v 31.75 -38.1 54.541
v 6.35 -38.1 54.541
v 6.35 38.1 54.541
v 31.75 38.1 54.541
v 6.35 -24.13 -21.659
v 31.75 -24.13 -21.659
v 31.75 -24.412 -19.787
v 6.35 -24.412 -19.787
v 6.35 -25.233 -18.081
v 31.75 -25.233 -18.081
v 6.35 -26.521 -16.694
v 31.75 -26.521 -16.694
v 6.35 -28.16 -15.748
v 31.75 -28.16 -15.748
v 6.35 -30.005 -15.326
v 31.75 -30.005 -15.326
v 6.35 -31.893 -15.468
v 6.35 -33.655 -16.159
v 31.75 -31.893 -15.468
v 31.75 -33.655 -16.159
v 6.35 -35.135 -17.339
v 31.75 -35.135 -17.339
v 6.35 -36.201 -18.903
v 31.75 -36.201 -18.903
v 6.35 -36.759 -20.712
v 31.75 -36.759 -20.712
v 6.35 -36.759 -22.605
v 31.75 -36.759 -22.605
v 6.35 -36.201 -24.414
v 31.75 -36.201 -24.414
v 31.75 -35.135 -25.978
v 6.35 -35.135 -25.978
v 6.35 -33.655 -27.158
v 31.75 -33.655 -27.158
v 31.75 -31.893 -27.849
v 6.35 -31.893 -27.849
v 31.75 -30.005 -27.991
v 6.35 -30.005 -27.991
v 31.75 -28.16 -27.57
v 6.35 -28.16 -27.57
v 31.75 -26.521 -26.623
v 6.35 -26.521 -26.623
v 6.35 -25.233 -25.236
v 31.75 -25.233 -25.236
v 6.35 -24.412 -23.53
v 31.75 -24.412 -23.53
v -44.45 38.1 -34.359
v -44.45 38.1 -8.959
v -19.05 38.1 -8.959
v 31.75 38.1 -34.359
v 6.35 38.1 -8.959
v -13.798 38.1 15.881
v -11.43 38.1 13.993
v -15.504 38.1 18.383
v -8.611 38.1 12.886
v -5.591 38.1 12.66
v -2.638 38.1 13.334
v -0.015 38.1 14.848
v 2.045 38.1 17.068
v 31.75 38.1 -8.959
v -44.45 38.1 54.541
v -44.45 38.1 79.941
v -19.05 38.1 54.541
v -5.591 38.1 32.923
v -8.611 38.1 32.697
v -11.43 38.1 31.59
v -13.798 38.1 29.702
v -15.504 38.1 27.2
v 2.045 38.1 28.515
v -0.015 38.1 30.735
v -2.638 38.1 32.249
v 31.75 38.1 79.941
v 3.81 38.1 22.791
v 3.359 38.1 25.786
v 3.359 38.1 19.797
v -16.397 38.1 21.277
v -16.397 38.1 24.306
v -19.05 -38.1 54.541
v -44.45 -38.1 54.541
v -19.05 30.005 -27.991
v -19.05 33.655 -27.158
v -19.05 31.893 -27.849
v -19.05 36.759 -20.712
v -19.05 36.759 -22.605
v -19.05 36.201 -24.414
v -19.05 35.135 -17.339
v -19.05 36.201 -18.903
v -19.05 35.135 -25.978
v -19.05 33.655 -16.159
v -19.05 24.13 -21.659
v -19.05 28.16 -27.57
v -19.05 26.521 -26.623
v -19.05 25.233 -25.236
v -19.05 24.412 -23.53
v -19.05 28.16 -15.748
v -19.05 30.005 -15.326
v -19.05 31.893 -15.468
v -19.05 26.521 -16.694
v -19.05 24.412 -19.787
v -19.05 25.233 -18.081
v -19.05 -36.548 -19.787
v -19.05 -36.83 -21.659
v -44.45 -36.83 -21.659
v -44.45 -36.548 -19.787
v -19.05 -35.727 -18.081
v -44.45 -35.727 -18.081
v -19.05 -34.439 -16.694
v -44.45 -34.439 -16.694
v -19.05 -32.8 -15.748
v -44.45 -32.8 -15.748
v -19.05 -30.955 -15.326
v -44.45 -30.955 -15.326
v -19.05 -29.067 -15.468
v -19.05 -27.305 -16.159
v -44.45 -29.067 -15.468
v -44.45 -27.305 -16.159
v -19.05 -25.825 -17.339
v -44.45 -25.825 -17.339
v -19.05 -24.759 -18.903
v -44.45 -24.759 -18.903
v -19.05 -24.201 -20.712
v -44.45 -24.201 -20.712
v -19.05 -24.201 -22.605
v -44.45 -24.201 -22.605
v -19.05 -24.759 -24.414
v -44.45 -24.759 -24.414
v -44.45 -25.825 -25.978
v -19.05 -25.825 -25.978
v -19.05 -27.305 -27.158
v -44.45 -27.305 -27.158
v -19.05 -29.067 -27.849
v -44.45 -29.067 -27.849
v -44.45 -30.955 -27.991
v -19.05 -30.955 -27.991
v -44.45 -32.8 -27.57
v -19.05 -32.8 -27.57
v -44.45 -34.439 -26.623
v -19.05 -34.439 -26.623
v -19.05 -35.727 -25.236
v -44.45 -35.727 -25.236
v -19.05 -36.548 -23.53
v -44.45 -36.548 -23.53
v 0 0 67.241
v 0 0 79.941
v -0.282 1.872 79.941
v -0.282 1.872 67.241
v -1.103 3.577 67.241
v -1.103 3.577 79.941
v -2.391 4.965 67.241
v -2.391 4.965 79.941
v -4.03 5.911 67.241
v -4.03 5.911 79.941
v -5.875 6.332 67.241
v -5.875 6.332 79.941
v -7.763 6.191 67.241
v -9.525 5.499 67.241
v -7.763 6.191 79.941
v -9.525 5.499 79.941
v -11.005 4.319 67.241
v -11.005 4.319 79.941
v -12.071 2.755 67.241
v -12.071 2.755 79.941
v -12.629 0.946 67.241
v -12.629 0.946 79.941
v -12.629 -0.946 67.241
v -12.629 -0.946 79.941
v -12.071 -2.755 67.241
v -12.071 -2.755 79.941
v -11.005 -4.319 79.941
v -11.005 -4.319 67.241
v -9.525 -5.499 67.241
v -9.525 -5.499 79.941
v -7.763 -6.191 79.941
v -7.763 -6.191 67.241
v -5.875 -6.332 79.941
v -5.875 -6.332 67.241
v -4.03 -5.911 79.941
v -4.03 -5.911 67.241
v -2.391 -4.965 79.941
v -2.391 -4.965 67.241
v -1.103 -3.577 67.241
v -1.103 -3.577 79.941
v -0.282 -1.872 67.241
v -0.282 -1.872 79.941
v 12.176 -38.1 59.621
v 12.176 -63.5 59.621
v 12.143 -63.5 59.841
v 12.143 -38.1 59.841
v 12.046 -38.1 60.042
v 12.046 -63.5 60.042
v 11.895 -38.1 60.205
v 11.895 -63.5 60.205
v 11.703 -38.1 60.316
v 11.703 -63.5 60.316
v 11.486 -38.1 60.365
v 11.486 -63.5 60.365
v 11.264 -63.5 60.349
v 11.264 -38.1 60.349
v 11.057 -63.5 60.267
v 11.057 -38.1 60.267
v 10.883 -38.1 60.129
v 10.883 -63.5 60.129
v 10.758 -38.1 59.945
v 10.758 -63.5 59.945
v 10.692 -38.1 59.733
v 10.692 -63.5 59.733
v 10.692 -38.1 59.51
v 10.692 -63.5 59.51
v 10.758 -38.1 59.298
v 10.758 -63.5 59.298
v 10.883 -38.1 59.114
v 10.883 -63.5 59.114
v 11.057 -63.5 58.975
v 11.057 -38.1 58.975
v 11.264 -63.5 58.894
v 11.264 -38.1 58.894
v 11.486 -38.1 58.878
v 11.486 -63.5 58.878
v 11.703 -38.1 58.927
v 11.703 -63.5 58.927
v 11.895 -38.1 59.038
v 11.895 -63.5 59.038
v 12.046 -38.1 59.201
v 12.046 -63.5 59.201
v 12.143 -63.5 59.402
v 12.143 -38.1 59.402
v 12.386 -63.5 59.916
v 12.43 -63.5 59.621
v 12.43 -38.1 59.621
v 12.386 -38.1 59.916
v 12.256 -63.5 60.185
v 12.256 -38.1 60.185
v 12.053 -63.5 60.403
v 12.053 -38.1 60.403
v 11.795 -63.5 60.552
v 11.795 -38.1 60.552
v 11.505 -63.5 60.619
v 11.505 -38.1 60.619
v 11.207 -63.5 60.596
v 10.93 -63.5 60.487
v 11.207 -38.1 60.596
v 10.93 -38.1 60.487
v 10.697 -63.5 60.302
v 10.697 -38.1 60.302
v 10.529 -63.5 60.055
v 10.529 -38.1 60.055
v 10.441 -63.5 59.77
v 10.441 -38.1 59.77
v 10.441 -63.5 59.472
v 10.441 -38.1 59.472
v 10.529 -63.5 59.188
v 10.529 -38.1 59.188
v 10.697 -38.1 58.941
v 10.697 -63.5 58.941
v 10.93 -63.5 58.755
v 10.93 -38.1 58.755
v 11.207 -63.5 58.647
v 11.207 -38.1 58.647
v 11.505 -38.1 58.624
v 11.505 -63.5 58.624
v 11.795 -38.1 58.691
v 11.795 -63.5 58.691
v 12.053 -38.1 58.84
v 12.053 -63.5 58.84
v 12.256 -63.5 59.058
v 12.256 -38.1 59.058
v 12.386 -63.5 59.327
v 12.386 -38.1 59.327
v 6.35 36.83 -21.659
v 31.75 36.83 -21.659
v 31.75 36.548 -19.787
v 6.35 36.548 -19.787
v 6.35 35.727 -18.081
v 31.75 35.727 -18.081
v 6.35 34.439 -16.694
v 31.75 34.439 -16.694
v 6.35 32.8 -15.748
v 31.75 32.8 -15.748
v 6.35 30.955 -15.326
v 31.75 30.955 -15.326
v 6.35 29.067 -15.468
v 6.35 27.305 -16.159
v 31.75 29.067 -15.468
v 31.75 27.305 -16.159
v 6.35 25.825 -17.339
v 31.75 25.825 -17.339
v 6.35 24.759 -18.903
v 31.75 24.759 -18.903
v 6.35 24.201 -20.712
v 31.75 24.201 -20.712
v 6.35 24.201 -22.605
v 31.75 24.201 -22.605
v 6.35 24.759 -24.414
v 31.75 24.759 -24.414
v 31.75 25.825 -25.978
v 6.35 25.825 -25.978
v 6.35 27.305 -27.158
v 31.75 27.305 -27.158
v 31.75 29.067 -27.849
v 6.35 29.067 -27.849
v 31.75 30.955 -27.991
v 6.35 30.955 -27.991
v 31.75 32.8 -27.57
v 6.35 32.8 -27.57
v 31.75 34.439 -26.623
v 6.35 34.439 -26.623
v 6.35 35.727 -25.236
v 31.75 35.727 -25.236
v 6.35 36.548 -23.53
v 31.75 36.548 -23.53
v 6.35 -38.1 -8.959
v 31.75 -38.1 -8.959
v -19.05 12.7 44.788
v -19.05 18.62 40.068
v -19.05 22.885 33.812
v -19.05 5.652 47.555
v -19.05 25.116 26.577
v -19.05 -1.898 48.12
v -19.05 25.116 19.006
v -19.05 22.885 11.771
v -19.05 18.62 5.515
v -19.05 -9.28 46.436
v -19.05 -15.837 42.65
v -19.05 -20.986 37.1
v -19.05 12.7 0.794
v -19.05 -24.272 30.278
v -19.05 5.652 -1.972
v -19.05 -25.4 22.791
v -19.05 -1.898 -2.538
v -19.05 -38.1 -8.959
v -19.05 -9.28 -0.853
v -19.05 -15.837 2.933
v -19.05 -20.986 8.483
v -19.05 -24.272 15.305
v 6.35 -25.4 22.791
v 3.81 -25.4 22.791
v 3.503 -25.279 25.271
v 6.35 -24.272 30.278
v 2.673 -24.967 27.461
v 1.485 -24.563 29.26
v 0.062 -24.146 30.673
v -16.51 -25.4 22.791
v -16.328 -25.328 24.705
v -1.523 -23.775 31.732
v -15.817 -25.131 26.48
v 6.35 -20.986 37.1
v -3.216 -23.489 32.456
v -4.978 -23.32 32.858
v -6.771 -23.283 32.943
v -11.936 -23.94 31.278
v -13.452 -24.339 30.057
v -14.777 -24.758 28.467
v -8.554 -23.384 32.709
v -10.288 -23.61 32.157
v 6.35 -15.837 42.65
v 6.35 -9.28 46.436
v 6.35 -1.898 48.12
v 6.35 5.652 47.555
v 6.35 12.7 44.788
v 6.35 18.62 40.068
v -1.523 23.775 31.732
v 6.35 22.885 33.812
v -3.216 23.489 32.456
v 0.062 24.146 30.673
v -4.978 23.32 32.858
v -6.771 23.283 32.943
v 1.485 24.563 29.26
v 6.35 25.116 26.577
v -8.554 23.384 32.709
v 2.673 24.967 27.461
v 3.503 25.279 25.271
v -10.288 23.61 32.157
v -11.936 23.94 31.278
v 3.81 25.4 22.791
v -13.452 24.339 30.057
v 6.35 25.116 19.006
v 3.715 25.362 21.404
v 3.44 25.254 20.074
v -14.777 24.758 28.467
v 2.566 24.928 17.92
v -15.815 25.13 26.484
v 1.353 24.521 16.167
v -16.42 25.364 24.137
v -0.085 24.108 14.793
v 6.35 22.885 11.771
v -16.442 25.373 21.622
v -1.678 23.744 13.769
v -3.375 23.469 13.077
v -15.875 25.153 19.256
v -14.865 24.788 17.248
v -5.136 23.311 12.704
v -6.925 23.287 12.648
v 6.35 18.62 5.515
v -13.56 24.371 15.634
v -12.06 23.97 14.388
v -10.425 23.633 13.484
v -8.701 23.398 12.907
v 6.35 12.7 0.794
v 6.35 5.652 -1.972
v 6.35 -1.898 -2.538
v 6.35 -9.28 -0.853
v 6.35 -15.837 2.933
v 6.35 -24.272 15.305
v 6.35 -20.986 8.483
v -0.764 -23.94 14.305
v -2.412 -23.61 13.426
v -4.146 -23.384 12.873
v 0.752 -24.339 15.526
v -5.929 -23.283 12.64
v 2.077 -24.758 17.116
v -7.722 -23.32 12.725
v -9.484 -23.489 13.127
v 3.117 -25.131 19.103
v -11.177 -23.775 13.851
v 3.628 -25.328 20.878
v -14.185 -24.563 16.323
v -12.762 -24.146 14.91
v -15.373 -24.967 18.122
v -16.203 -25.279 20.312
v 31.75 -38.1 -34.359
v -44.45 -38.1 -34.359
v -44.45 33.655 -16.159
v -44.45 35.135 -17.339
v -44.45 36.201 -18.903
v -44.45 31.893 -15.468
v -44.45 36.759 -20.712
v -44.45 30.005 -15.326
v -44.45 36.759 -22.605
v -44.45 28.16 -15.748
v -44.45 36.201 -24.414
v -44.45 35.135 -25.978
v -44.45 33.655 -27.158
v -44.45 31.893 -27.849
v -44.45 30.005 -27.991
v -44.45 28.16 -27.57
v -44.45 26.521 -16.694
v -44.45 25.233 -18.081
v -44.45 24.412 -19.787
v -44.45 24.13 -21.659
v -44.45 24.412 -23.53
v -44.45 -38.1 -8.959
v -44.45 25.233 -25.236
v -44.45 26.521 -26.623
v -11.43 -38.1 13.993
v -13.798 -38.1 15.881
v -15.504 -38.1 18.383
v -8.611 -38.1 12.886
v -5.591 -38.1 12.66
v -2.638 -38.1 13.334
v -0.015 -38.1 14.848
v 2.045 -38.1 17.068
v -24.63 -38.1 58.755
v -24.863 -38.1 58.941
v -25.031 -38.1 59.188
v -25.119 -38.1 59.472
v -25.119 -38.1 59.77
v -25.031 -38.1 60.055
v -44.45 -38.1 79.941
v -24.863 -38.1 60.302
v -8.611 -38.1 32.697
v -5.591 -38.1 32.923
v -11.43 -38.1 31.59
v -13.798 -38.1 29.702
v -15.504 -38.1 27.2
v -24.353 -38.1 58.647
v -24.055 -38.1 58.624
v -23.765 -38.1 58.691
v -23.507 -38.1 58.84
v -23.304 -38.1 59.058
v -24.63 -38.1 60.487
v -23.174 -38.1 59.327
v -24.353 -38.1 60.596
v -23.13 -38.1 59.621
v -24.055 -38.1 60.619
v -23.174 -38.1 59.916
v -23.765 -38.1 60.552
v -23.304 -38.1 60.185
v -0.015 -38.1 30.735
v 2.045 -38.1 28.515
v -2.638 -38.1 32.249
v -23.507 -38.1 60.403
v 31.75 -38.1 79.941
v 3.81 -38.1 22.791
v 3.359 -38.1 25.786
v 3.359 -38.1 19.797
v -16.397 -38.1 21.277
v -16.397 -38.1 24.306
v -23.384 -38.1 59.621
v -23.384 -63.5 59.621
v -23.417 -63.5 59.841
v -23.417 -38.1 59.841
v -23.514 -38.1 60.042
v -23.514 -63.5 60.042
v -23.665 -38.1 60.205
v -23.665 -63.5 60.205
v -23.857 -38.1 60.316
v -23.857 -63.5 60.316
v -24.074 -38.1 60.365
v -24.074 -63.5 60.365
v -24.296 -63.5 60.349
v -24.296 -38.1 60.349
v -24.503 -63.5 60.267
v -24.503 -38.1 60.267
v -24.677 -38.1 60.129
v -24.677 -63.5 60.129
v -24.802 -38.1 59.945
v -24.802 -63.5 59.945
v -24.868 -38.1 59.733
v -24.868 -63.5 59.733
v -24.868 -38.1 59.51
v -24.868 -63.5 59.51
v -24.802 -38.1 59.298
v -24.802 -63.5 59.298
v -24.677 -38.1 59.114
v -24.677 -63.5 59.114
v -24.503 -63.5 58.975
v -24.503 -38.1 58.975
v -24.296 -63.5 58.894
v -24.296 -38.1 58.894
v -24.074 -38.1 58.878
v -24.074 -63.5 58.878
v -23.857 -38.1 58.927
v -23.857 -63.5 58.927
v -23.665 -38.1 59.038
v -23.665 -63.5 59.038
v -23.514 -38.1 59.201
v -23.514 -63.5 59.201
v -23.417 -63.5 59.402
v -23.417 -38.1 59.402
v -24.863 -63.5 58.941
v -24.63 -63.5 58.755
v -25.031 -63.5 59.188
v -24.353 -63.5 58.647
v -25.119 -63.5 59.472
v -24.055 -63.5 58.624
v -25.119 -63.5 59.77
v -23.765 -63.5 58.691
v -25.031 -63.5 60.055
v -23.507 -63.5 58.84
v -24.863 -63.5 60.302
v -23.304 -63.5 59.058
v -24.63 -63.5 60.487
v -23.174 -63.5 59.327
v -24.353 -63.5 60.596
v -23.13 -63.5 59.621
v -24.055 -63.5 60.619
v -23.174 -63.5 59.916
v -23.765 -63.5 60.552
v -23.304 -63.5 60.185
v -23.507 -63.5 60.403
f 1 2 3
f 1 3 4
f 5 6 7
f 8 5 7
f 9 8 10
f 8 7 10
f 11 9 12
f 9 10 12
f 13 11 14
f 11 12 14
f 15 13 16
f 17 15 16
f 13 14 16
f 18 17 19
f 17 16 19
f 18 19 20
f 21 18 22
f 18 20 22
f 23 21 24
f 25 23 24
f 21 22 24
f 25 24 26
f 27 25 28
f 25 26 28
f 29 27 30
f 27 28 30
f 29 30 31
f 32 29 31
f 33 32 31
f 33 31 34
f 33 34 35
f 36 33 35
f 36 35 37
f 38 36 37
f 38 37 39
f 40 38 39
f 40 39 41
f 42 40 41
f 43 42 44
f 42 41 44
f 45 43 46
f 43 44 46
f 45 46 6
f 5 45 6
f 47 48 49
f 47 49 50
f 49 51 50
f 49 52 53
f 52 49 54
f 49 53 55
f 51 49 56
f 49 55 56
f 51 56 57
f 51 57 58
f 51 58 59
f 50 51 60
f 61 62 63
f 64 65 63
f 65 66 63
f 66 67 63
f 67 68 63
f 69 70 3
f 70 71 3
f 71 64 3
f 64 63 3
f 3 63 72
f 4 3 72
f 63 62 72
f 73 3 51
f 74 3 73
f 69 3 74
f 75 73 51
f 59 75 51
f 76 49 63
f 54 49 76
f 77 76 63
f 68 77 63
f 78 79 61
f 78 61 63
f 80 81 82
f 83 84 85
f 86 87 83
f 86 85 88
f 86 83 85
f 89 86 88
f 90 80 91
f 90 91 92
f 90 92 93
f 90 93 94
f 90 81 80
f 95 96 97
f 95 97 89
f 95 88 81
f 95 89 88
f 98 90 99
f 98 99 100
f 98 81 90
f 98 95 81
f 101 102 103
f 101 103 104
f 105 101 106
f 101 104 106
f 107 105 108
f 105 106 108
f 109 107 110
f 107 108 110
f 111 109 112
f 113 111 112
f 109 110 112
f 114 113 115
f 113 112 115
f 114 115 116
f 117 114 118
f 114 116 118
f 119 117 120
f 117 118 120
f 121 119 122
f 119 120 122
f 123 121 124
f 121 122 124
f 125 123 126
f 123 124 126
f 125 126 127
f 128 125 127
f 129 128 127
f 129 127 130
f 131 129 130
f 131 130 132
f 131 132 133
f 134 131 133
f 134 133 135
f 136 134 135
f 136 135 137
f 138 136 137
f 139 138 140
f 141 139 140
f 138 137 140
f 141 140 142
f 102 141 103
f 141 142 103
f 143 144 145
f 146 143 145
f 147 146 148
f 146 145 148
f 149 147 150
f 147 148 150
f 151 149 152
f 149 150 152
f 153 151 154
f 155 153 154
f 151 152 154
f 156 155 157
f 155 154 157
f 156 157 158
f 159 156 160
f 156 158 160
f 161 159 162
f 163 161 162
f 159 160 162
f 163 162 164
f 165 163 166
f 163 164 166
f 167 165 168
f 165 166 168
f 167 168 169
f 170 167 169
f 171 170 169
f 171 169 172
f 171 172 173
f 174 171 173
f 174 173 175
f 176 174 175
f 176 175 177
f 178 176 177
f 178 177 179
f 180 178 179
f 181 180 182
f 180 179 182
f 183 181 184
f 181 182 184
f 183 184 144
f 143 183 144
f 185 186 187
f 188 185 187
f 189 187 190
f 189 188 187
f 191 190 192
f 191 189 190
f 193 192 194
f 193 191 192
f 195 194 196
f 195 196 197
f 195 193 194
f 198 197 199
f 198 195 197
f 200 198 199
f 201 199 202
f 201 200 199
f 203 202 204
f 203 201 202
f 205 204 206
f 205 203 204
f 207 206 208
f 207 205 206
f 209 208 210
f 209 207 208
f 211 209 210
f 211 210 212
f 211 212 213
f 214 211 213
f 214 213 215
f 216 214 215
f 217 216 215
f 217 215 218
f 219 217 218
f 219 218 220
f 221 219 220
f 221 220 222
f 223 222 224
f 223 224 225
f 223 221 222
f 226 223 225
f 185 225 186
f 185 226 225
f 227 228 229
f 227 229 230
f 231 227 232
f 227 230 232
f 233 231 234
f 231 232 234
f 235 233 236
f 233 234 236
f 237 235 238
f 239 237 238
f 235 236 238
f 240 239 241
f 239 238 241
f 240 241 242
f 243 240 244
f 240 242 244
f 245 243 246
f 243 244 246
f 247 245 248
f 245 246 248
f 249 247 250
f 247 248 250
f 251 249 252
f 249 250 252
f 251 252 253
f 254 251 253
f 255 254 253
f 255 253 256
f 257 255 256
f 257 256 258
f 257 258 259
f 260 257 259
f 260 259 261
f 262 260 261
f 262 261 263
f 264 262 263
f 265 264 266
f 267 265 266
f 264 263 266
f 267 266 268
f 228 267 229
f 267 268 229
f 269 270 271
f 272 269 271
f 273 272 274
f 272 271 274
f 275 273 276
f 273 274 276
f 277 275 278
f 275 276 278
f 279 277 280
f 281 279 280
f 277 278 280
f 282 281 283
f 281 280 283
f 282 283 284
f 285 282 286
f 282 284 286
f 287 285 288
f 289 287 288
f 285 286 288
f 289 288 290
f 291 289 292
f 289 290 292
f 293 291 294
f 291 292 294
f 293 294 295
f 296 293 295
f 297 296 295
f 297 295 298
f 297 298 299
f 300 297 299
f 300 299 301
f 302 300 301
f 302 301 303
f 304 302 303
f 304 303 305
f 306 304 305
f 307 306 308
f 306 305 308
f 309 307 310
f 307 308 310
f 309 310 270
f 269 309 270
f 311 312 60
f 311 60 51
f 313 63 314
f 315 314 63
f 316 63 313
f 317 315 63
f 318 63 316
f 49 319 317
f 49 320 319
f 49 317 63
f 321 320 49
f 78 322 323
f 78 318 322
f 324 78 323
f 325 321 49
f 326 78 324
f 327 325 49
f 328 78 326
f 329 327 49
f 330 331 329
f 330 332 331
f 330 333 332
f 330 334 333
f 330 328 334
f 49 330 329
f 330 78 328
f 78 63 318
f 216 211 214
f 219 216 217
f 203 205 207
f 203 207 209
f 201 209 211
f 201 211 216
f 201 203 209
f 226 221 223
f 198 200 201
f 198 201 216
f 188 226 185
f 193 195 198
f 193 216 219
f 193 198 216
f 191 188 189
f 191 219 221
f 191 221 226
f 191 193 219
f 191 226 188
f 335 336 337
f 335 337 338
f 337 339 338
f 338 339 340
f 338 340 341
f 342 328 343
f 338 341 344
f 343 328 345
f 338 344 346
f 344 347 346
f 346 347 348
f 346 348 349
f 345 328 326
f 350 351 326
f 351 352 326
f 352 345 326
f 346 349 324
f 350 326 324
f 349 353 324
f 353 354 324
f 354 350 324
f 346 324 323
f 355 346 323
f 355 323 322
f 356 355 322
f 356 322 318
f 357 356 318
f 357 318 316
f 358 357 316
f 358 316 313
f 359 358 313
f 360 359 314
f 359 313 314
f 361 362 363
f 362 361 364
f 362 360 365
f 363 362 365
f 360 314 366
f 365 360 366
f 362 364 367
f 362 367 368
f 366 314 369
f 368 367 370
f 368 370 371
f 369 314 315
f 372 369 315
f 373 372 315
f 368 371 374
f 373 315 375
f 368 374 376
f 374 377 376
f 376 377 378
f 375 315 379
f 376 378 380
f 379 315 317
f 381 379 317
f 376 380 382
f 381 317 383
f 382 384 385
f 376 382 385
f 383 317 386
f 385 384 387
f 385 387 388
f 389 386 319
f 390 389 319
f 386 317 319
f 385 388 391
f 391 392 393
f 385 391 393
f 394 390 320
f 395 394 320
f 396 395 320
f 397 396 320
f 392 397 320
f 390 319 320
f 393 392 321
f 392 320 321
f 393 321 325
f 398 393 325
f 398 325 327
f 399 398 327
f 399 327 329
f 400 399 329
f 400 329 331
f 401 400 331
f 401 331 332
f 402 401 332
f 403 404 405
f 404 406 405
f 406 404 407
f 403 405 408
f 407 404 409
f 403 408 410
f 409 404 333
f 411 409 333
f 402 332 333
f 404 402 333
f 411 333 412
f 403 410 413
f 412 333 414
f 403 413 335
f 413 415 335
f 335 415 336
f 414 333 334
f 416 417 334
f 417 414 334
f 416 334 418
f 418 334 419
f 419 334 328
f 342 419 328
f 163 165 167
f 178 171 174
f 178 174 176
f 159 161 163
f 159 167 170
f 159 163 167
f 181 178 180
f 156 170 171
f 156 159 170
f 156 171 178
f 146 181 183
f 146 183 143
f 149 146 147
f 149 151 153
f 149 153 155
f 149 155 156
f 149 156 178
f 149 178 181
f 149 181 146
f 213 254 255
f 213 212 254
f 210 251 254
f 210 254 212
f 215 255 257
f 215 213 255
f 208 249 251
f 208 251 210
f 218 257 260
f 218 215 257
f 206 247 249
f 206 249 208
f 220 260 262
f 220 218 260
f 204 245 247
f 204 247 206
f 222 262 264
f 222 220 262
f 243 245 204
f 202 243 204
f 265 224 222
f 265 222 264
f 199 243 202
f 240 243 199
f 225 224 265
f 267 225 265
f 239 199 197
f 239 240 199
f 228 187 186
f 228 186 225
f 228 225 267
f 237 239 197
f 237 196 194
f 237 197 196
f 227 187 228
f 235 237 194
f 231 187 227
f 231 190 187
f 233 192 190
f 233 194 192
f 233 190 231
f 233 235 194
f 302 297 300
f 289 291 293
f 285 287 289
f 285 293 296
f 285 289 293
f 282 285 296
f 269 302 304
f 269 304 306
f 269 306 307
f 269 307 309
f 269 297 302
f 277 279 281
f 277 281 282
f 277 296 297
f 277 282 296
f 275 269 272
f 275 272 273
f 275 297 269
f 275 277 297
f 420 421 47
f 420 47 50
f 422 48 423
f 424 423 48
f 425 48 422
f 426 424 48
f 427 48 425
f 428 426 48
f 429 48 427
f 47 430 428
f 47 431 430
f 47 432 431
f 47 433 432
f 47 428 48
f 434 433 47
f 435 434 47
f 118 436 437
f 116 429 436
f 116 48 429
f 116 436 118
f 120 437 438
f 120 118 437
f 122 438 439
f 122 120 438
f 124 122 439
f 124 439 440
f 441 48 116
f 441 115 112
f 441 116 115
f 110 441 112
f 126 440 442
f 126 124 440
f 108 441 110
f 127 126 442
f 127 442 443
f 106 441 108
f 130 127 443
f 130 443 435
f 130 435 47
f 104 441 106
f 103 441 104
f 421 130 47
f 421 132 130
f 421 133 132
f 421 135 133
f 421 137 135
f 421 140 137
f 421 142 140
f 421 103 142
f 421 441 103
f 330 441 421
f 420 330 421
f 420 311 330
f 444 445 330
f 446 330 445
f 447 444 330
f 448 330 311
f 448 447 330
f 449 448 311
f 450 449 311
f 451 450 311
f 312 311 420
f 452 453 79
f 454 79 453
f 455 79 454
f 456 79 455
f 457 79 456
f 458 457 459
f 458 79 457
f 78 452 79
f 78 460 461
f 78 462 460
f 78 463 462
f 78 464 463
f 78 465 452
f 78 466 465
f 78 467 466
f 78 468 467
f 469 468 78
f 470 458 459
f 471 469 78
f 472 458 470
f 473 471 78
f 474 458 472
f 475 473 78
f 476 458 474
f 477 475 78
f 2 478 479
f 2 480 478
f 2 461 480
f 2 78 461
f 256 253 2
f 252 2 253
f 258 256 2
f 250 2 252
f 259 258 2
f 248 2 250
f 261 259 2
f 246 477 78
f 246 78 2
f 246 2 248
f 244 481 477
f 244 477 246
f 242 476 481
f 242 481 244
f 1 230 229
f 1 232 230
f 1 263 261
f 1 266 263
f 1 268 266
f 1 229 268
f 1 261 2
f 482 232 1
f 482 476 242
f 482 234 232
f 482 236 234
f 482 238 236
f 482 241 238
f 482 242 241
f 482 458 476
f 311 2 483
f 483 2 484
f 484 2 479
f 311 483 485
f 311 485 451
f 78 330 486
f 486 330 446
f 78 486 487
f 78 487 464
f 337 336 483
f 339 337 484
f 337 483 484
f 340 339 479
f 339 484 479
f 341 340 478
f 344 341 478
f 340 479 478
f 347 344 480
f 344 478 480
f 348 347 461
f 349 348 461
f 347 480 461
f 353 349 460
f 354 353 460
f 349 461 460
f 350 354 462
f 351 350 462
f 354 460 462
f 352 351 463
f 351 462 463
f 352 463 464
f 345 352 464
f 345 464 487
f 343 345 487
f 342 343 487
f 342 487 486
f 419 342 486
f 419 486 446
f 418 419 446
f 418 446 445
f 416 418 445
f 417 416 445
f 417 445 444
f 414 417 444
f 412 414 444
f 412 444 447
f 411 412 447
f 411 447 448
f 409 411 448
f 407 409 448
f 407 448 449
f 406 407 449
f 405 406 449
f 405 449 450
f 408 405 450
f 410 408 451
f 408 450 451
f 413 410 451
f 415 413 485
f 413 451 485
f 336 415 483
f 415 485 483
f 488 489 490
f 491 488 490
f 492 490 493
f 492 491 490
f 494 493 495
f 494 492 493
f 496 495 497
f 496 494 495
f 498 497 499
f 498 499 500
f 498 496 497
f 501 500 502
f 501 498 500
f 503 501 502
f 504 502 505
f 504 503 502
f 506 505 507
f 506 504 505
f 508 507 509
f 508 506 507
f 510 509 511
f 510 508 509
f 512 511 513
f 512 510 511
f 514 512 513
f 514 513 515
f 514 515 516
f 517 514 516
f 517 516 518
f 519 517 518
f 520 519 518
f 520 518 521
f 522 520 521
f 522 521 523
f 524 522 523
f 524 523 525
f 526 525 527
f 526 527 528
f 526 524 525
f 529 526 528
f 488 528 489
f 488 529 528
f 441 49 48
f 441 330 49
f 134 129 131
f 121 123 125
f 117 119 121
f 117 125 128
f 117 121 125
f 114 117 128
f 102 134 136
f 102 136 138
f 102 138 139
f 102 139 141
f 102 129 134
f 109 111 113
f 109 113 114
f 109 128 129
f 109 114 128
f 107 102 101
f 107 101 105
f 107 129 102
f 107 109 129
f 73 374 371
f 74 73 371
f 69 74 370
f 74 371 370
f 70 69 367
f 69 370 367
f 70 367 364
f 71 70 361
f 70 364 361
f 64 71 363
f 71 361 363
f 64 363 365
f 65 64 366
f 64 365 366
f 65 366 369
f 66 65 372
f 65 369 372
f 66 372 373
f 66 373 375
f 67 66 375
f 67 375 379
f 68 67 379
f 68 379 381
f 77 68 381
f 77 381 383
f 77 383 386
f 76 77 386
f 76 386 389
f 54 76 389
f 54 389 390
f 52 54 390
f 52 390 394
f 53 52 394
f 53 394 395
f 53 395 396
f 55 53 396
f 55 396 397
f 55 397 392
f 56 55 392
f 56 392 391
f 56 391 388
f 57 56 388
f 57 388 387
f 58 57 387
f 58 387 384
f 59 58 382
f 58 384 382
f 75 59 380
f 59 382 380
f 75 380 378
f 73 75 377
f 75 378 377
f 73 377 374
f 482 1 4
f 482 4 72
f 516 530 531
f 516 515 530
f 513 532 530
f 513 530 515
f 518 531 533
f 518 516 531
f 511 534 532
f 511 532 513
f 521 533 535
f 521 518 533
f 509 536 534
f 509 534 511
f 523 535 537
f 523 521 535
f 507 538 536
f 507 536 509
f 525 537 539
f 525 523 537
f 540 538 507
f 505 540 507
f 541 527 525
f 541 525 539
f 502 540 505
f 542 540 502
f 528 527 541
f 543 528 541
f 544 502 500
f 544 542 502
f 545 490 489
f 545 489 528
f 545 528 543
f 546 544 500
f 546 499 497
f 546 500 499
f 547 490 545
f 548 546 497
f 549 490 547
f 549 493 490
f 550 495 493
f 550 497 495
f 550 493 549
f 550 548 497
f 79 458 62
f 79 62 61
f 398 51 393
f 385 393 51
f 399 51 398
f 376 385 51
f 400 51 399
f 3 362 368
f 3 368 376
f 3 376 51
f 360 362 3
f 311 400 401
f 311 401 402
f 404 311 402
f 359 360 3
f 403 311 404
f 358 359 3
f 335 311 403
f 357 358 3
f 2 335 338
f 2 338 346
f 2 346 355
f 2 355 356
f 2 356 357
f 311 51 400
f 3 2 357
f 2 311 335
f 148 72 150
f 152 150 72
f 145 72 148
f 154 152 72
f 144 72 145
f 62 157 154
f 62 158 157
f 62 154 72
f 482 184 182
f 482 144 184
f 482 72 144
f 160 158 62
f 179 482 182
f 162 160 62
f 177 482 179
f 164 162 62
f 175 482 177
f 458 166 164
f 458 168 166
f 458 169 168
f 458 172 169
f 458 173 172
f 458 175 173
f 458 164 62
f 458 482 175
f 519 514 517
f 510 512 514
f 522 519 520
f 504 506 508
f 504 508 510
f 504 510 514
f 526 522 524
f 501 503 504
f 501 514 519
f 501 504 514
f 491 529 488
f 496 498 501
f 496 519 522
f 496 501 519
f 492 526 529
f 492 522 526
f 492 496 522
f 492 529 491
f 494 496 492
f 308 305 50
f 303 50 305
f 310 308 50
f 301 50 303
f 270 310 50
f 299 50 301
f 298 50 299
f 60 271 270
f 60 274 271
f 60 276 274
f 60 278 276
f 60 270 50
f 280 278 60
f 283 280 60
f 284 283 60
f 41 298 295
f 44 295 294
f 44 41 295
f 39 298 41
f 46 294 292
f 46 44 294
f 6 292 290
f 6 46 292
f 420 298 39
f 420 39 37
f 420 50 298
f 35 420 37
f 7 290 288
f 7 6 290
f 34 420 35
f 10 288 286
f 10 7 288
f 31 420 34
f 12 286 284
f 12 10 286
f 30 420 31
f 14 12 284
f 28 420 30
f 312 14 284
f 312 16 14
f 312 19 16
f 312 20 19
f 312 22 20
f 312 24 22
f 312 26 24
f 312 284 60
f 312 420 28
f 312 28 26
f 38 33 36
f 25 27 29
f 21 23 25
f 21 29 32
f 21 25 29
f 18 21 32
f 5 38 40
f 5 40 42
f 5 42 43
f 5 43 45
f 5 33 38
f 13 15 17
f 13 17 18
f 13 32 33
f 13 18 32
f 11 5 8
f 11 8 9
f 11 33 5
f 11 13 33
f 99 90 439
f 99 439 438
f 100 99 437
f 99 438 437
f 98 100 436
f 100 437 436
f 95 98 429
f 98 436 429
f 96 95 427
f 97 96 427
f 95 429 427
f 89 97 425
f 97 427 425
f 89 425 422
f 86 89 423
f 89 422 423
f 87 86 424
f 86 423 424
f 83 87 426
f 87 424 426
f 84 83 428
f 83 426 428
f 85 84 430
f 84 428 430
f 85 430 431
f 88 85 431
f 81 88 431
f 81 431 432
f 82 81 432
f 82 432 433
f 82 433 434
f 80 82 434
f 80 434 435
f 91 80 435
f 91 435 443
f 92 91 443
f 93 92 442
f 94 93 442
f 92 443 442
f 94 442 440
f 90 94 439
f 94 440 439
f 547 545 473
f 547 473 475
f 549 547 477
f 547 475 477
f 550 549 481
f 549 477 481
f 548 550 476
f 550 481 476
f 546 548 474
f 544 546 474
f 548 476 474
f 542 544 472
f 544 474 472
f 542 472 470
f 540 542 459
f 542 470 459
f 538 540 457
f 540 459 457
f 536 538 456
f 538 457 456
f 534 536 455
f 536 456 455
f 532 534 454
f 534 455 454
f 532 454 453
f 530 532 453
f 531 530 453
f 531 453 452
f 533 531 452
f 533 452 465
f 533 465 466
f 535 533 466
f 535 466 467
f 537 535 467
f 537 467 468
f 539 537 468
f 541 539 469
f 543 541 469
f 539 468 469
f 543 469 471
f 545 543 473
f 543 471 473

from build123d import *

# Parameters (mm, degrees)
F1_DEPTH  = 38.1
F3_D      = 50.8
F5_R      = 6.35
F6_DEPTH  = 25.4
F4_R      = 6.35
F7_DEPTH  = 25.4
F8_R      = 6.35
F9_DEPTH  = 12.7
F10_R     = 1
F10_R_2   = 0.746
F11_DEPTH = 25.4
F10_R_3   = 10.16
F12_DEPTH = 101.6


with BuildPart() as f1:
    # F0 (on Front) → F1 (new body, symmetric)
    with BuildSketch(Plane.XZ):
        Polygon((-44.45, -8.95857), (-44.45, -34.35857), (31.75, -34.35857), (31.75, -8.95857), (6.35, -8.95857), (6.35, 54.54143), (31.75, 54.54143), (31.75, 79.94143), (-44.45, 79.94143), (-44.45, 54.54143), (-19.05, 54.54143), (-19.05, -8.95857), align=None)
    extrude(amount=F1_DEPTH, both=True)

    # F3 (through all)
    with Locations(Plane.YZ.offset(6.35)):
        with Locations((0, 22.79143)):
            Hole(F3_D / 2)

    # F5 (on face) → F6 (cut)
    with BuildSketch(Plane.YZ.offset(31.75)):
        with Locations((-30.48, -21.65857)):
            Circle(F5_R)
        with Locations((30.48, -21.65857)):
            Circle(F5_R)
    extrude(amount=-F6_DEPTH, mode=Mode.SUBTRACT)

    # F4 (on face) → F7 (cut)
    with BuildSketch(Plane(origin=(-44.45, 0, 0), x_dir=(0, -1, 0), z_dir=(-1, 0, 0))):
        with Locations((30.48, -21.65857)):
            Circle(F4_R)
        with Locations((-30.48, -21.65857)):
            Circle(F4_R)
    extrude(amount=-F7_DEPTH, mode=Mode.SUBTRACT)

    # F8 (on face) → F9 (cut)
    with BuildSketch(Plane.XY.offset(79.94143)):
        with Locations((-6.35, 0)):
            Circle(F8_R)
    extrude(amount=-F9_DEPTH, mode=Mode.SUBTRACT)

    # F10 (on face) → F11 (join)
    with BuildSketch(Plane.XZ.offset(38.1)):
        with Locations((11.43, 59.62143)):
            Circle(F10_R)
        with Locations((11.43, 59.62143)):
            Circle(F10_R_2, mode=Mode.SUBTRACT)
        with Locations((-24.13, 59.62143)):
            Circle(F10_R)
        with Locations((-24.13, 59.62143)):
            Circle(F10_R_2, mode=Mode.SUBTRACT)
    extrude(amount=F11_DEPTH)

    # F10 (on face) → F12 (cut)
    with BuildSketch(Plane.XZ.offset(38.1)):
        with Locations((-6.35, 22.79143)):
            Circle(F10_R_3)
    extrude(amount=-F12_DEPTH, mode=Mode.SUBTRACT)


solid = f1.part
